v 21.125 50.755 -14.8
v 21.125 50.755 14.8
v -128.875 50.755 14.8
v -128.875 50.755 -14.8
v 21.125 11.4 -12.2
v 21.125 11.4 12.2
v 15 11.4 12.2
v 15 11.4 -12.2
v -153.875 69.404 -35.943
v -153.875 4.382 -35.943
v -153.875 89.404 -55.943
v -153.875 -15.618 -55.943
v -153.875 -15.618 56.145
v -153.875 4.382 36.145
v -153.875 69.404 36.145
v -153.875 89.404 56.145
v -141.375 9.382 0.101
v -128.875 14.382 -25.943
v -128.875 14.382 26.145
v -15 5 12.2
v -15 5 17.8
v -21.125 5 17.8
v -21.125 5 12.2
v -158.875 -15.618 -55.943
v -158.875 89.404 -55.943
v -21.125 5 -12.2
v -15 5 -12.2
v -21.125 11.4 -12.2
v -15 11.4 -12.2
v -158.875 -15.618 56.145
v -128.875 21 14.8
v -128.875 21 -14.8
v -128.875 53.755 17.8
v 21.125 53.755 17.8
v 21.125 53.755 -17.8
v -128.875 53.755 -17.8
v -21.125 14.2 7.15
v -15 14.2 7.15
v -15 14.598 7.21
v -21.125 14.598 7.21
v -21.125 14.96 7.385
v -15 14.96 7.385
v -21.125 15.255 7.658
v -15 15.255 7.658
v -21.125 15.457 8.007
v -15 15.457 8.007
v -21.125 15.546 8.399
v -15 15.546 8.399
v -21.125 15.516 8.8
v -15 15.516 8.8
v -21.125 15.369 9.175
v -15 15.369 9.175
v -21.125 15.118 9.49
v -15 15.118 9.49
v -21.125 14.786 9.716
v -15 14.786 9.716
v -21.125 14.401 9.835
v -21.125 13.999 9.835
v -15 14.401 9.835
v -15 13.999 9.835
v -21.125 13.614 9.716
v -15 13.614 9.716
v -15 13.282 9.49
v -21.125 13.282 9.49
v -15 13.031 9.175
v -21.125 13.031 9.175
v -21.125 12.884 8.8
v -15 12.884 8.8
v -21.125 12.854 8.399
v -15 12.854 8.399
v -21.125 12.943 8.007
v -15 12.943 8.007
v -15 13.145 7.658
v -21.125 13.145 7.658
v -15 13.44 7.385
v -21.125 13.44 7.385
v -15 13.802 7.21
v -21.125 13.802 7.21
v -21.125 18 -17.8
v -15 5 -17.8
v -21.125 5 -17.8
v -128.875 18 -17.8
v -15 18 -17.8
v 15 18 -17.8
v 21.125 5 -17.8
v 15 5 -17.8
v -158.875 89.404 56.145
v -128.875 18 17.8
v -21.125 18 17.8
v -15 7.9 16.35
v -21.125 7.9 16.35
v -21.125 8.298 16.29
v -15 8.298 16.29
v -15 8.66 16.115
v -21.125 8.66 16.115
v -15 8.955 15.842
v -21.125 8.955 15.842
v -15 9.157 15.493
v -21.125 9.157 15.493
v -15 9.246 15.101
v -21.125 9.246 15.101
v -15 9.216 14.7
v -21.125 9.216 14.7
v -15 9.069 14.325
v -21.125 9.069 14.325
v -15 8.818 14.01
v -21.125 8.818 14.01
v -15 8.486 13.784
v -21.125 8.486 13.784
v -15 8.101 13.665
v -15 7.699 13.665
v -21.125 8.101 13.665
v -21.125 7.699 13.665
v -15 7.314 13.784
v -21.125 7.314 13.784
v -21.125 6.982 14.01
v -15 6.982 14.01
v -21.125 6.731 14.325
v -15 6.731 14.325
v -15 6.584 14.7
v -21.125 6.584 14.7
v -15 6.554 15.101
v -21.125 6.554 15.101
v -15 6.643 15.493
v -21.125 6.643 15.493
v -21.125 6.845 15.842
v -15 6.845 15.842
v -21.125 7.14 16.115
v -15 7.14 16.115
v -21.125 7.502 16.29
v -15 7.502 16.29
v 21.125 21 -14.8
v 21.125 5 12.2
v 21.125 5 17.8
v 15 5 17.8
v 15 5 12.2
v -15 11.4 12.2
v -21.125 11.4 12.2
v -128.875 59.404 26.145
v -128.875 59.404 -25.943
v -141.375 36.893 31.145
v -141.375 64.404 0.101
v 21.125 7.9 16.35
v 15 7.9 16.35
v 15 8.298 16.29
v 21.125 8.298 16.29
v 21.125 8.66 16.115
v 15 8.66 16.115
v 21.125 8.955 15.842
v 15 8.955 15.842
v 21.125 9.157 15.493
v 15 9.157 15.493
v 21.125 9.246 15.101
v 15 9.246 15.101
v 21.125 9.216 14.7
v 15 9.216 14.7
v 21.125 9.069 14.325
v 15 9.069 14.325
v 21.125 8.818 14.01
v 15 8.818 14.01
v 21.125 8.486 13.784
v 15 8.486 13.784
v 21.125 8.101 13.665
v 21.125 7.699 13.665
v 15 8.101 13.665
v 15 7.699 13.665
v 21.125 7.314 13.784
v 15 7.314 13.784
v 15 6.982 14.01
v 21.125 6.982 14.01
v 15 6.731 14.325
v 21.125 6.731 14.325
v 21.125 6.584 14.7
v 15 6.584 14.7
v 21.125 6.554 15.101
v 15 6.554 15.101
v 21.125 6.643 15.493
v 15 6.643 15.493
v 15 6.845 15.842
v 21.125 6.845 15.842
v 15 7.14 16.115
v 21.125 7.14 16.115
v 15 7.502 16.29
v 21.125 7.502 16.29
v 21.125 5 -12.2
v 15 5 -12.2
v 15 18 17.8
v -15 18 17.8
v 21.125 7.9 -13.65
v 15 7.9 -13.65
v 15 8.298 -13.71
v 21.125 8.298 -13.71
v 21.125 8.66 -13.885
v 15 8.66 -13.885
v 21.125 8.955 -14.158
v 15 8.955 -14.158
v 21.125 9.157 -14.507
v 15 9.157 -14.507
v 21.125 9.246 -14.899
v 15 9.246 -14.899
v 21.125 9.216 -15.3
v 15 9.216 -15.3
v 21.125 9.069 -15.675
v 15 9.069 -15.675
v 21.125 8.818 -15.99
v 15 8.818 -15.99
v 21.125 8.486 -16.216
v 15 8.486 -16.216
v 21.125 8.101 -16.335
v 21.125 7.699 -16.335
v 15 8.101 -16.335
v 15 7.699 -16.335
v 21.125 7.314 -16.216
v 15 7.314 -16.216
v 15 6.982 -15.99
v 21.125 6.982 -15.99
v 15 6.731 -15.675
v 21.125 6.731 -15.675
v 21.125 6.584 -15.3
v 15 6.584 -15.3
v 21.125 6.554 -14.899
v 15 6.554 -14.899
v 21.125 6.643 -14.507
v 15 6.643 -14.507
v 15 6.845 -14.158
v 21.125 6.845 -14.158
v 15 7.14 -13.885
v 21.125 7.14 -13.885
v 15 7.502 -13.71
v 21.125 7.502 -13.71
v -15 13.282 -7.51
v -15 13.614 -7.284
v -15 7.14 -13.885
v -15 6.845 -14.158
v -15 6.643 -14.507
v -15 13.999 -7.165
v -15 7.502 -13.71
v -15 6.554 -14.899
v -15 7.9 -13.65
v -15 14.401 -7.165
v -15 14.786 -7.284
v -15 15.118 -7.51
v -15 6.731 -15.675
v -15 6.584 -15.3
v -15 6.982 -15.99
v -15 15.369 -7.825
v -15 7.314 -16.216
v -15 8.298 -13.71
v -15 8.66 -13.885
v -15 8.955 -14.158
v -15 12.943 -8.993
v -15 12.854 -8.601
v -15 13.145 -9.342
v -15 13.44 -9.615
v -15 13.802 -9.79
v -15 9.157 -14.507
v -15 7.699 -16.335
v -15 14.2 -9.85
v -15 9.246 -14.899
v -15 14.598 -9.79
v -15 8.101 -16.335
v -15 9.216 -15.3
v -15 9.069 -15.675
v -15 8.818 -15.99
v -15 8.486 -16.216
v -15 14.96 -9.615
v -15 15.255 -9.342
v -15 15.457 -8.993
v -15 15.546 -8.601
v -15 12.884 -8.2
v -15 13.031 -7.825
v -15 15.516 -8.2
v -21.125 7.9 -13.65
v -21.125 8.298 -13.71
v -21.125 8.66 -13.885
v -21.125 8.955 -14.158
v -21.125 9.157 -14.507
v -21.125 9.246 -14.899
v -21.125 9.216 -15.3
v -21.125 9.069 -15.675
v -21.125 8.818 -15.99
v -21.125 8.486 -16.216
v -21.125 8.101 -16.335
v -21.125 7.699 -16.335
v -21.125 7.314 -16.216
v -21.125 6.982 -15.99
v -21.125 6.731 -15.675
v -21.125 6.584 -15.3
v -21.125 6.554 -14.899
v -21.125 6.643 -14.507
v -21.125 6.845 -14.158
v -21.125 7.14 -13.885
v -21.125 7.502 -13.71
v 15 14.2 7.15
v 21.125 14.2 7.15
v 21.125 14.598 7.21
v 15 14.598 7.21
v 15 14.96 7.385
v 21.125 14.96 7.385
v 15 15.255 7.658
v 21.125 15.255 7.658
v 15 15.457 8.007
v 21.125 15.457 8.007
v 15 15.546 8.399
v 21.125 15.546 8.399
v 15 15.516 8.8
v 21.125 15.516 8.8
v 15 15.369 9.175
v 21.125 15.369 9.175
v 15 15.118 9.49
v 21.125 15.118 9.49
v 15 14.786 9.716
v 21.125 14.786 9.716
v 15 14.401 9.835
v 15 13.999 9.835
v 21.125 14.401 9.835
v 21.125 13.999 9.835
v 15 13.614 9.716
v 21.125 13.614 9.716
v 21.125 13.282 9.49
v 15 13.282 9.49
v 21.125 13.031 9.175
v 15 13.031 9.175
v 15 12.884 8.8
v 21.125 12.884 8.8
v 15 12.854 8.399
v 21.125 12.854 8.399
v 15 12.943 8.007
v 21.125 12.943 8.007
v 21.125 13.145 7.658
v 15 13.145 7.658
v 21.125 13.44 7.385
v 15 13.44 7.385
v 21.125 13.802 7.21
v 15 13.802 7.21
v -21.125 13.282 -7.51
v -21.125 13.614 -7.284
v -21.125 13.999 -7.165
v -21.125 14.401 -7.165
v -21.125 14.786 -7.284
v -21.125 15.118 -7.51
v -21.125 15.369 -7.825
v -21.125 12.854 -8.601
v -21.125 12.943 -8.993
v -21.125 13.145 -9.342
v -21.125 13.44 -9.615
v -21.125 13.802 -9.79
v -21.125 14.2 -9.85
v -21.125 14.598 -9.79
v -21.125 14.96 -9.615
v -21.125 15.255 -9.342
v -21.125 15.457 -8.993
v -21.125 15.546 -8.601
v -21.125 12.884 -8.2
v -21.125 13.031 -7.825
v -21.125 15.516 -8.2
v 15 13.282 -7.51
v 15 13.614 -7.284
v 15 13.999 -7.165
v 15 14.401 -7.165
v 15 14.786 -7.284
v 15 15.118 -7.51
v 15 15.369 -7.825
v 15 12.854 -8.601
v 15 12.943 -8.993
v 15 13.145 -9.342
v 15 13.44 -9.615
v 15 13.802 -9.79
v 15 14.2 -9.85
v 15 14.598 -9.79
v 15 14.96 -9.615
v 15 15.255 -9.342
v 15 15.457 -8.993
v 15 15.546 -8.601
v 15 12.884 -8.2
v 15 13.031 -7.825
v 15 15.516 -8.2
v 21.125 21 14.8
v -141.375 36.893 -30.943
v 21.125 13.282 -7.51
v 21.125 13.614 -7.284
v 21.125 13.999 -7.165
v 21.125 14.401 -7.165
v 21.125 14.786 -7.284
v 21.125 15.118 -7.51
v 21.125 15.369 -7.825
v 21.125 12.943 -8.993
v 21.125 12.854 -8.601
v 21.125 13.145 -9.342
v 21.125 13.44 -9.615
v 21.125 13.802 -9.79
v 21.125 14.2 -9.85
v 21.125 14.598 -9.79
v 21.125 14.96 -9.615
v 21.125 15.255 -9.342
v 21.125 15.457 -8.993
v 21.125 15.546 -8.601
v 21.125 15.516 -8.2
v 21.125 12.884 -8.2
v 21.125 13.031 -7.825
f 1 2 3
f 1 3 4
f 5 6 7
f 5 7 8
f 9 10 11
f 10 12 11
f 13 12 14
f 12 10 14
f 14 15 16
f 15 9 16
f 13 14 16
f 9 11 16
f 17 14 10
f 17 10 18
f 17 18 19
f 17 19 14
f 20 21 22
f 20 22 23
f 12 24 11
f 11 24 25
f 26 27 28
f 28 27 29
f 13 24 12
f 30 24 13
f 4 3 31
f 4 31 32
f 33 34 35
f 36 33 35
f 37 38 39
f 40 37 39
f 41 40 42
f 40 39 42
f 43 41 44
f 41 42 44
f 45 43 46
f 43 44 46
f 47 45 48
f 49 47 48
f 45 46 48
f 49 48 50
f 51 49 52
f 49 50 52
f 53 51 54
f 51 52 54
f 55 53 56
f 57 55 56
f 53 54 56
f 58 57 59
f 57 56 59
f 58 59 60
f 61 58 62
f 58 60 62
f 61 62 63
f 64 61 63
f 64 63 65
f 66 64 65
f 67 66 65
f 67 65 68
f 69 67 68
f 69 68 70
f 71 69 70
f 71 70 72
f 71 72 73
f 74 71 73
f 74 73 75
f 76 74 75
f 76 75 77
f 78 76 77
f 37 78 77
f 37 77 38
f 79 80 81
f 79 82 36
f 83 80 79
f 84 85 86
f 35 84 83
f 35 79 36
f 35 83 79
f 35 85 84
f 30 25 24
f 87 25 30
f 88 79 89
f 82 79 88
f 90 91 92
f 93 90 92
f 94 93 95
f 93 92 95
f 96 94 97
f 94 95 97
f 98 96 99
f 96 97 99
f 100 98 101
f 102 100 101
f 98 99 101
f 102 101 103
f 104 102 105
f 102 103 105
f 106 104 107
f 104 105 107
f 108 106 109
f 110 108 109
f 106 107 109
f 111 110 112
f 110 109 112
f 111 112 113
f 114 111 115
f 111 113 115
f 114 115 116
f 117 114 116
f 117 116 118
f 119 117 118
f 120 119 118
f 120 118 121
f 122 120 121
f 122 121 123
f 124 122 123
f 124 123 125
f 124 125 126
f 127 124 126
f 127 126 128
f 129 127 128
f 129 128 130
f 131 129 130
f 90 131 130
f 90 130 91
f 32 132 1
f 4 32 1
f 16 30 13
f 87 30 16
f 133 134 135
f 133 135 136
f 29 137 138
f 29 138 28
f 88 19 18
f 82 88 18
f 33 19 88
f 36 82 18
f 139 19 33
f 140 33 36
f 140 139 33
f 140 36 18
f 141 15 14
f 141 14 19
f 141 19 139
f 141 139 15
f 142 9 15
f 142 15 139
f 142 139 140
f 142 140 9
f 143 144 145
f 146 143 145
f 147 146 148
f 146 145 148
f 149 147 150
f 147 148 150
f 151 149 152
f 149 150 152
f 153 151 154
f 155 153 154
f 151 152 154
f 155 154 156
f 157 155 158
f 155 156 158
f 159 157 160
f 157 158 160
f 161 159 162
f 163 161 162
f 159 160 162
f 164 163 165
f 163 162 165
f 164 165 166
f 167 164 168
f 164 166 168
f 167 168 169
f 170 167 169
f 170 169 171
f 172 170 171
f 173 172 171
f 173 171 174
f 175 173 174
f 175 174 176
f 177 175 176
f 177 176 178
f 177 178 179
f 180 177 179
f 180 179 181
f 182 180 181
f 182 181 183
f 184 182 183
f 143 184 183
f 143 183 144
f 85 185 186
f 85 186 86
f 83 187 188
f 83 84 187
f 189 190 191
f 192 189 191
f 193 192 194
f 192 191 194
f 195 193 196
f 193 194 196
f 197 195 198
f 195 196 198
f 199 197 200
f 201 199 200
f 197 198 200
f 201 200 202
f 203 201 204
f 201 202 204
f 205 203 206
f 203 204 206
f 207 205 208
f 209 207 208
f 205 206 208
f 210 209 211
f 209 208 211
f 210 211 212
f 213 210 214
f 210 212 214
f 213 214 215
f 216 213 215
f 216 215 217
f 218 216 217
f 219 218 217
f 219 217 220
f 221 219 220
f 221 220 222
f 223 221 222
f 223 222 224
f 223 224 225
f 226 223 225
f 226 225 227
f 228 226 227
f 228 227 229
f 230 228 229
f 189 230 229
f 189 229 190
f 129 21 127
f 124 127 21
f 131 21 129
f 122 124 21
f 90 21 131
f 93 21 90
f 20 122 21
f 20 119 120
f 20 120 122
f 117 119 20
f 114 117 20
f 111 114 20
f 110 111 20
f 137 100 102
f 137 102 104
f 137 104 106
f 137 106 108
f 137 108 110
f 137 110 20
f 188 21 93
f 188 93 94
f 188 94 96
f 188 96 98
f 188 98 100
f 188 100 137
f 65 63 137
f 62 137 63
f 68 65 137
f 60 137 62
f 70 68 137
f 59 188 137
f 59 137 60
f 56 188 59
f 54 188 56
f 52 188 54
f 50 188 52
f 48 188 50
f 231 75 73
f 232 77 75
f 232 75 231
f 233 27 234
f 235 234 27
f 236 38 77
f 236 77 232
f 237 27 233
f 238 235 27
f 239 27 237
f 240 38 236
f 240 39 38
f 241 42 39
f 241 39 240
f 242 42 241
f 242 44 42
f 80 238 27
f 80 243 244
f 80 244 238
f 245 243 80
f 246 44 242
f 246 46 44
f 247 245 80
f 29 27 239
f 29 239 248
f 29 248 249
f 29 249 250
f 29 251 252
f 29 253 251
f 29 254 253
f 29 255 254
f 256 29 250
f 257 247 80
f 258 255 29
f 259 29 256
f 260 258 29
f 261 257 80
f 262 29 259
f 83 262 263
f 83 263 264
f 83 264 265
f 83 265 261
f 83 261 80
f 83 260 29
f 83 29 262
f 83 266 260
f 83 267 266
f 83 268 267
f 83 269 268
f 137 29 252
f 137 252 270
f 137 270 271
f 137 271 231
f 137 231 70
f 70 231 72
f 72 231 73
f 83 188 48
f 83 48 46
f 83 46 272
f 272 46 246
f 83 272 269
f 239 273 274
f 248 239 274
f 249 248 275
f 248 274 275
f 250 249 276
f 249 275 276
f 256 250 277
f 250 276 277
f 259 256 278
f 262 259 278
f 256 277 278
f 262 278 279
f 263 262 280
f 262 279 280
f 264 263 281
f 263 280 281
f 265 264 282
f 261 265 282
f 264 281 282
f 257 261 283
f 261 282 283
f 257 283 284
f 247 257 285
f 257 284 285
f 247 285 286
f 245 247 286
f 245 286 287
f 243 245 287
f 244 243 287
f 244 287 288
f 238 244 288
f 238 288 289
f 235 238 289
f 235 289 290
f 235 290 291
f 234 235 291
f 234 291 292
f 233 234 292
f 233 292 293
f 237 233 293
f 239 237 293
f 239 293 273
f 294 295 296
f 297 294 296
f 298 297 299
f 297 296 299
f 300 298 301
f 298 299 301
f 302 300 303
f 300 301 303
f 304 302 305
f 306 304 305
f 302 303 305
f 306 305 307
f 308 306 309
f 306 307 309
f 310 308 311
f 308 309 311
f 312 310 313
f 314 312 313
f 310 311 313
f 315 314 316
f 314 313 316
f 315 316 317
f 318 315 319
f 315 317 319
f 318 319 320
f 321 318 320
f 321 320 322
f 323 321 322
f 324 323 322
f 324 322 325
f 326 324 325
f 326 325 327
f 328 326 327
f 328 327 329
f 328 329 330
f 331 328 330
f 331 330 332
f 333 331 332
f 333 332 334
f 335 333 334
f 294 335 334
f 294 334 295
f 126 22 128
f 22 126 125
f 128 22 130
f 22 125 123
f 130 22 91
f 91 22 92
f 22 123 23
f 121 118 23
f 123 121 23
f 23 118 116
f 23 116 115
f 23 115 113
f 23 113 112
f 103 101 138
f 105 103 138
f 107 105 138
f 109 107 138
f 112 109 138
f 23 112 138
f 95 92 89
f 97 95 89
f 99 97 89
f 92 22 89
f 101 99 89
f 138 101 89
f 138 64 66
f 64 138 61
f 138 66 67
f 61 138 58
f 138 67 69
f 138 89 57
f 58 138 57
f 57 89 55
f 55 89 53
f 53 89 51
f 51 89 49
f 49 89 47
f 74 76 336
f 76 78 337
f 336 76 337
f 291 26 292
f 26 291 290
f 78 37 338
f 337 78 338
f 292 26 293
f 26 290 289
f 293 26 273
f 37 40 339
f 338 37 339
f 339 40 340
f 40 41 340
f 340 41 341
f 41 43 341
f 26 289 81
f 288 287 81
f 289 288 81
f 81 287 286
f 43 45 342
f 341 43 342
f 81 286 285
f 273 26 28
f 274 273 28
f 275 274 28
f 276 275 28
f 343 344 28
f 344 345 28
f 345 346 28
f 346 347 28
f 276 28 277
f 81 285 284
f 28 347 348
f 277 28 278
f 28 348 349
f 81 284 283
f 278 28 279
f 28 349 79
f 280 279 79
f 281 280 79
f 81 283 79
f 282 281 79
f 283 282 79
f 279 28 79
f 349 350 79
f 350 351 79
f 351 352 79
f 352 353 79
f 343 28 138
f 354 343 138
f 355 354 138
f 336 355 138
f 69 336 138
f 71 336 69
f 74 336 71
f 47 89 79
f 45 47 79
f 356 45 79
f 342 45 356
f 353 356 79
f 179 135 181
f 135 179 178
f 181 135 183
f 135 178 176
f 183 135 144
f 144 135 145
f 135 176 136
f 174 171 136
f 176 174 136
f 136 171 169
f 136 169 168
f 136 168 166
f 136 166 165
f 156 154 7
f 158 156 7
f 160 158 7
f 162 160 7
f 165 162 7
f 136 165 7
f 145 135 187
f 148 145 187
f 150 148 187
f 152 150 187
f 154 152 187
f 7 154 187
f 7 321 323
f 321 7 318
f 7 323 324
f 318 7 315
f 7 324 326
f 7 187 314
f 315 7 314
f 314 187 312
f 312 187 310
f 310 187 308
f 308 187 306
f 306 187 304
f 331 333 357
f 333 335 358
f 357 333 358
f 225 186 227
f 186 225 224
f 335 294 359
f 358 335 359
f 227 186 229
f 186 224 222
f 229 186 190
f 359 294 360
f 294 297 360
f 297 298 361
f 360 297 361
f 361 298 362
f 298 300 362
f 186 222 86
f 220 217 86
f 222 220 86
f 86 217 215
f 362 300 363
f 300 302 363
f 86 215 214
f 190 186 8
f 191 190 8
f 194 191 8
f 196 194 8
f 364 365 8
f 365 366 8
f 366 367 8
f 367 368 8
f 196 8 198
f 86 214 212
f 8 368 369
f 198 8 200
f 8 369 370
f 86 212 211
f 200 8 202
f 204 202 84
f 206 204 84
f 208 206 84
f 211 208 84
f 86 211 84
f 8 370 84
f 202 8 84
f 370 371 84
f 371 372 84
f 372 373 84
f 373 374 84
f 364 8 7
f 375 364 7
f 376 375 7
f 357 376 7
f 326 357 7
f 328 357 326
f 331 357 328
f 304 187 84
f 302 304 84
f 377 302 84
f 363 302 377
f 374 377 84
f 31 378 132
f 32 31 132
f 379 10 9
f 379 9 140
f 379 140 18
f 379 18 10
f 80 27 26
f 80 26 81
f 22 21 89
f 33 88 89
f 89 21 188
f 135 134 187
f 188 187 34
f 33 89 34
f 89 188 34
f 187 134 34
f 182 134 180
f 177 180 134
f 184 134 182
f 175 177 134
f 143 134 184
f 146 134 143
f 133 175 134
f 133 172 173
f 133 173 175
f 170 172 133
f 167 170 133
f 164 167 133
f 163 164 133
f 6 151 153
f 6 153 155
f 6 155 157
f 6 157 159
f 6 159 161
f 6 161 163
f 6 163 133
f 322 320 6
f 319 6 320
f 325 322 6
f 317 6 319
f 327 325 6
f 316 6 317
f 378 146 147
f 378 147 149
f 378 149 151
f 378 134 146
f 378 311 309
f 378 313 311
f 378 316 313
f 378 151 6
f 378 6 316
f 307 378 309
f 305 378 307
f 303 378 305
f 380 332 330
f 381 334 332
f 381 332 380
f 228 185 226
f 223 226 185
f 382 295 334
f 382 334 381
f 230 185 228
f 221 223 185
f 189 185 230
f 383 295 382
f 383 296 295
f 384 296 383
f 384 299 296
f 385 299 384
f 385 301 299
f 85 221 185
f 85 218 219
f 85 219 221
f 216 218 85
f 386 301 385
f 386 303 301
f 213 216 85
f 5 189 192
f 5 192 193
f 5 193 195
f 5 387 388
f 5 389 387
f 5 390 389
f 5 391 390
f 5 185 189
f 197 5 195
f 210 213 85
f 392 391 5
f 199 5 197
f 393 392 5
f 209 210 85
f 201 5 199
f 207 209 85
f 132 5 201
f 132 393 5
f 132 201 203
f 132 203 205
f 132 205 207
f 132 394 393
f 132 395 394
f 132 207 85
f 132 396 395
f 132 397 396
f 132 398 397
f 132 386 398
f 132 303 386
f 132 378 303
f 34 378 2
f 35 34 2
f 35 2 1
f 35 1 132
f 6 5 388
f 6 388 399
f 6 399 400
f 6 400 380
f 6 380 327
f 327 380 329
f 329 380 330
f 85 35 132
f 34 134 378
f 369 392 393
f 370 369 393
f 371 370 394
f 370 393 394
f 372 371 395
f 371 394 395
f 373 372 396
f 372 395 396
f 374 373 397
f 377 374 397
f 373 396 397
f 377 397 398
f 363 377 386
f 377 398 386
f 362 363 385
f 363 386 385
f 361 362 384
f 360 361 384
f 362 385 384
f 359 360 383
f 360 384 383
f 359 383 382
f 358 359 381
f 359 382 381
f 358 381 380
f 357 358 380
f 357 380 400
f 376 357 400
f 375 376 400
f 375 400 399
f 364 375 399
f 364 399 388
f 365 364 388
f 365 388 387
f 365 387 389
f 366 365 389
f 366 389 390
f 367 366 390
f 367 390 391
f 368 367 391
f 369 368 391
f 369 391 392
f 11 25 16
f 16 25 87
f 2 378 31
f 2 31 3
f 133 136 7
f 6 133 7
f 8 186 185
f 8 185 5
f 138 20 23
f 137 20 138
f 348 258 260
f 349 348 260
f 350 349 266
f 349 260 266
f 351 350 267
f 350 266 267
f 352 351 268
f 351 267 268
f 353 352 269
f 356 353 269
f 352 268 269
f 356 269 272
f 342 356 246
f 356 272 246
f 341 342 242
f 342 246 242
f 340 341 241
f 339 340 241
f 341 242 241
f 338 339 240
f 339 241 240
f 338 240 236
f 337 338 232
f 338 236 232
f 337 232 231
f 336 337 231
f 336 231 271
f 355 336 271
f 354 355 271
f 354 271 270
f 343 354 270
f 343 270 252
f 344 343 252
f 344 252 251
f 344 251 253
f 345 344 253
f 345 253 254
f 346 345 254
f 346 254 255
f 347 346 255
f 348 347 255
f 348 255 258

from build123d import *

# Parameters (mm, degrees)
SKETCH1_W                = 42.25
SKETCH1_H                = 35.6
BOSS_EXTRUDE1_DEPTH      = 2
SKETCH2_W                = 2
SKETCH2_H                = 35.6
BOSS_EXTRUDE2_DEPTH      = 50
SKETCH1_2_W              = 42.25
SKETCH1_2_H              = 35.6
CUT_EXTRUDE6_DEPTH       = 20
SKETCH8_W                = 42.25
SKETCH8_H                = 35.6
BOSS_EXTRUDE3_DEPTH      = 2
SKETCH9_W                = 35.6
SKETCH9_H                = 13
BOSS_EXTRUDE4_DEPTH      = 42.25
SKETCH12_W               = 30
SKETCH12_H               = 13
CUT_EXTRUDE9_DEPTH       = 36.6
SKETCH13_W               = 24.4
SKETCH13_H               = 13
CUT_EXTRUDE10_DEPTH      = 37.125
CUT_EXTRUDE10_DEPTH_BACK = 7.125
SKETCH15_R               = 1.35
CUT_EXTRUDE11_DEPTH      = 43.25
SKETCH16_W               = 35.6
SKETCH16_H               = 35.754688938
BOSS_EXTRUDE5_DEPTH      = 150
SKETCH18_W               = 112.087725711
SKETCH18_H               = 105.02156137
BOSS_EXTRUDE6_DEPTH      = 5
SKETCH20_W               = 72.087725711
SKETCH20_H               = 65.02156137
SKETCH17_W               = 52.087725711
SKETCH17_H               = 45.02156137
SKETCH21_W               = 29.6
SKETCH21_H               = 29.754688938
CUT_EXTRUDE13_DEPTH      = 150
SKETCH25_W               = 24.4
SKETCH25_H               = 6.6
BOSS_EXTRUDE9_DEPTH      = 6.125
SKETCH26_W               = 24.4
SKETCH26_H               = 6.6
BOSS_EXTRUDE10_DEPTH     = 6.125
SKETCH27_R               = 1.35
CUT_EXTRUDE15_DEPTH      = 42.25


with BuildPart() as part:
    # Sketch1 → Boss-Extrude1 (new body)
    with BuildSketch(Plane(origin=(0, 0, 0), x_dir=(1, 0, 0), z_dir=(0, 1, 0))):
        Rectangle(SKETCH1_W, SKETCH1_H)
    extrude(amount=BOSS_EXTRUDE1_DEPTH)

    # Sketch2 → Boss-Extrude2 (add)
    with BuildSketch(Plane(origin=(0, 2, 0), x_dir=(1, 0, 0), z_dir=(0, 1, 0))):
        with Locations((-20.125, 0)):
            Rectangle(SKETCH2_W, SKETCH2_H)
        with Locations((20.125, 0)):
            Rectangle(SKETCH2_W, SKETCH2_H)
    extrude(amount=BOSS_EXTRUDE2_DEPTH)

    # Sketch1<2> → Cut-Extrude6 (cut)
    with BuildSketch(Plane(origin=(0, 0, 0), x_dir=(1, 0, 0), z_dir=(0, 1, 0))):
        Rectangle(SKETCH1_2_W, SKETCH1_2_H)
    extrude(amount=CUT_EXTRUDE6_DEPTH, mode=Mode.SUBTRACT)

    # Sketch8 → Boss-Extrude3 (add)
    with BuildSketch(Plane.XZ.offset(-20)):
        Rectangle(SKETCH8_W, SKETCH8_H)
    extrude(amount=BOSS_EXTRUDE3_DEPTH)

    # Sketch9 → Boss-Extrude4 (add)
    with BuildSketch(Plane(origin=(21.125, 0, 0), x_dir=(0, 0, -1), z_dir=(1, 0, 0))):
        with Locations((0, 11.5)):
            Rectangle(SKETCH9_W, SKETCH9_H)
    extrude(amount=-BOSS_EXTRUDE4_DEPTH)

    # Sketch12 → Cut-Extrude9 (cut, through all)
    with BuildSketch(Plane(origin=(0, 0, -17.8), x_dir=(-1, 0, 0), z_dir=(0, 0, -1))):
        with Locations((0, 11.5)):
            Rectangle(SKETCH12_W, SKETCH12_H)
    extrude(amount=-CUT_EXTRUDE9_DEPTH, mode=Mode.SUBTRACT)

    # Sketch13 → Cut-Extrude10 (cut, two sides)
    with BuildSketch(Plane.ZY.offset(-15)) as cut_extrude10_sk:
        with Locations((0, 11.5)):
            Rectangle(SKETCH13_W, SKETCH13_H)
    extrude(amount=CUT_EXTRUDE10_DEPTH, mode=Mode.SUBTRACT)
    extrude(cut_extrude10_sk.sketch, amount=-CUT_EXTRUDE10_DEPTH_BACK, mode=Mode.SUBTRACT)

    # Sketch15 → Cut-Extrude11 (cut, through all)
    with BuildSketch(Plane.ZY.offset(21.125)):
        with Locations((-15, 7.9)):
            Circle(SKETCH15_R)
        with Locations((15, 7.9)):
            Circle(SKETCH15_R)
    extrude(amount=-CUT_EXTRUDE11_DEPTH, mode=Mode.SUBTRACT)

    # Sketch16 → Boss-Extrude5 (add)
    with BuildSketch(Plane(origin=(21.125, 0, 0), x_dir=(0, 0, -1), z_dir=(1, 0, 0))):
        with Locations((0, 35.877344469)):
            Rectangle(SKETCH16_W, SKETCH16_H)
    extrude(amount=-BOSS_EXTRUDE5_DEPTH)



with BuildPart() as body_2:
    # Sketch18 → Boss-Extrude6 (new body)
    with BuildSketch(Plane.ZY.offset(158.875)):
        with Locations((0.100945205, 36.893036207)):
            Rectangle(SKETCH18_W, SKETCH18_H)
    extrude(amount=-BOSS_EXTRUDE6_DEPTH)


with BuildPart() as part_1:
    add(part.part)

    add(body_2.part)  # Loft1 merges body 2
    # Sketch20 → Loft1 section 0
    with BuildSketch(Plane(origin=(-153.875, 0, 0), x_dir=(0, 0, -1), z_dir=(1, 0, 0))):
        with Locations((-0.100945205, 36.893036207)):
            Rectangle(SKETCH20_W, SKETCH20_H)
    # Sketch17 → Loft1 section 1
    with BuildSketch(Plane.ZY.offset(128.875)):
        with Locations((0.100945205, 36.893036207)):
            Rectangle(SKETCH17_W, SKETCH17_H)
    loft()

    # Sketch21 → Cut-Extrude13 (cut)
    with BuildSketch(Plane(origin=(21.125, 0, 0), x_dir=(0, 0, -1), z_dir=(1, 0, 0))):
        with Locations((0, 35.877344469)):
            Rectangle(SKETCH21_W, SKETCH21_H)
    extrude(amount=-CUT_EXTRUDE13_DEPTH, mode=Mode.SUBTRACT)

    # Sketch25 → Boss-Extrude9 (add)
    with BuildSketch(Plane(origin=(21.125, 0, 0), x_dir=(0, 0, -1), z_dir=(1, 0, 0))):
        with Locations((0, 14.7)):
            Rectangle(SKETCH25_W, SKETCH25_H)
    extrude(amount=-BOSS_EXTRUDE9_DEPTH)

    # Sketch26 → Boss-Extrude10 (add)
    with BuildSketch(Plane(origin=(-15, 0, 0), x_dir=(0, 0, -1), z_dir=(1, 0, 0))):
        with Locations((0, 14.7)):
            Rectangle(SKETCH26_W, SKETCH26_H)
    extrude(amount=-BOSS_EXTRUDE10_DEPTH)

    # Sketch27 → Cut-Extrude15 (cut)
    with BuildSketch(Plane(origin=(21.125, 0, 0), x_dir=(0, 0, -1), z_dir=(1, 0, 0))):
        with Locations((8.5, 14.2)):
            Circle(SKETCH27_R)
        with Locations((-8.5, 14.2)):
            Circle(SKETCH27_R)
    extrude(amount=-CUT_EXTRUDE15_DEPTH, mode=Mode.SUBTRACT)


solid = part_1.part
